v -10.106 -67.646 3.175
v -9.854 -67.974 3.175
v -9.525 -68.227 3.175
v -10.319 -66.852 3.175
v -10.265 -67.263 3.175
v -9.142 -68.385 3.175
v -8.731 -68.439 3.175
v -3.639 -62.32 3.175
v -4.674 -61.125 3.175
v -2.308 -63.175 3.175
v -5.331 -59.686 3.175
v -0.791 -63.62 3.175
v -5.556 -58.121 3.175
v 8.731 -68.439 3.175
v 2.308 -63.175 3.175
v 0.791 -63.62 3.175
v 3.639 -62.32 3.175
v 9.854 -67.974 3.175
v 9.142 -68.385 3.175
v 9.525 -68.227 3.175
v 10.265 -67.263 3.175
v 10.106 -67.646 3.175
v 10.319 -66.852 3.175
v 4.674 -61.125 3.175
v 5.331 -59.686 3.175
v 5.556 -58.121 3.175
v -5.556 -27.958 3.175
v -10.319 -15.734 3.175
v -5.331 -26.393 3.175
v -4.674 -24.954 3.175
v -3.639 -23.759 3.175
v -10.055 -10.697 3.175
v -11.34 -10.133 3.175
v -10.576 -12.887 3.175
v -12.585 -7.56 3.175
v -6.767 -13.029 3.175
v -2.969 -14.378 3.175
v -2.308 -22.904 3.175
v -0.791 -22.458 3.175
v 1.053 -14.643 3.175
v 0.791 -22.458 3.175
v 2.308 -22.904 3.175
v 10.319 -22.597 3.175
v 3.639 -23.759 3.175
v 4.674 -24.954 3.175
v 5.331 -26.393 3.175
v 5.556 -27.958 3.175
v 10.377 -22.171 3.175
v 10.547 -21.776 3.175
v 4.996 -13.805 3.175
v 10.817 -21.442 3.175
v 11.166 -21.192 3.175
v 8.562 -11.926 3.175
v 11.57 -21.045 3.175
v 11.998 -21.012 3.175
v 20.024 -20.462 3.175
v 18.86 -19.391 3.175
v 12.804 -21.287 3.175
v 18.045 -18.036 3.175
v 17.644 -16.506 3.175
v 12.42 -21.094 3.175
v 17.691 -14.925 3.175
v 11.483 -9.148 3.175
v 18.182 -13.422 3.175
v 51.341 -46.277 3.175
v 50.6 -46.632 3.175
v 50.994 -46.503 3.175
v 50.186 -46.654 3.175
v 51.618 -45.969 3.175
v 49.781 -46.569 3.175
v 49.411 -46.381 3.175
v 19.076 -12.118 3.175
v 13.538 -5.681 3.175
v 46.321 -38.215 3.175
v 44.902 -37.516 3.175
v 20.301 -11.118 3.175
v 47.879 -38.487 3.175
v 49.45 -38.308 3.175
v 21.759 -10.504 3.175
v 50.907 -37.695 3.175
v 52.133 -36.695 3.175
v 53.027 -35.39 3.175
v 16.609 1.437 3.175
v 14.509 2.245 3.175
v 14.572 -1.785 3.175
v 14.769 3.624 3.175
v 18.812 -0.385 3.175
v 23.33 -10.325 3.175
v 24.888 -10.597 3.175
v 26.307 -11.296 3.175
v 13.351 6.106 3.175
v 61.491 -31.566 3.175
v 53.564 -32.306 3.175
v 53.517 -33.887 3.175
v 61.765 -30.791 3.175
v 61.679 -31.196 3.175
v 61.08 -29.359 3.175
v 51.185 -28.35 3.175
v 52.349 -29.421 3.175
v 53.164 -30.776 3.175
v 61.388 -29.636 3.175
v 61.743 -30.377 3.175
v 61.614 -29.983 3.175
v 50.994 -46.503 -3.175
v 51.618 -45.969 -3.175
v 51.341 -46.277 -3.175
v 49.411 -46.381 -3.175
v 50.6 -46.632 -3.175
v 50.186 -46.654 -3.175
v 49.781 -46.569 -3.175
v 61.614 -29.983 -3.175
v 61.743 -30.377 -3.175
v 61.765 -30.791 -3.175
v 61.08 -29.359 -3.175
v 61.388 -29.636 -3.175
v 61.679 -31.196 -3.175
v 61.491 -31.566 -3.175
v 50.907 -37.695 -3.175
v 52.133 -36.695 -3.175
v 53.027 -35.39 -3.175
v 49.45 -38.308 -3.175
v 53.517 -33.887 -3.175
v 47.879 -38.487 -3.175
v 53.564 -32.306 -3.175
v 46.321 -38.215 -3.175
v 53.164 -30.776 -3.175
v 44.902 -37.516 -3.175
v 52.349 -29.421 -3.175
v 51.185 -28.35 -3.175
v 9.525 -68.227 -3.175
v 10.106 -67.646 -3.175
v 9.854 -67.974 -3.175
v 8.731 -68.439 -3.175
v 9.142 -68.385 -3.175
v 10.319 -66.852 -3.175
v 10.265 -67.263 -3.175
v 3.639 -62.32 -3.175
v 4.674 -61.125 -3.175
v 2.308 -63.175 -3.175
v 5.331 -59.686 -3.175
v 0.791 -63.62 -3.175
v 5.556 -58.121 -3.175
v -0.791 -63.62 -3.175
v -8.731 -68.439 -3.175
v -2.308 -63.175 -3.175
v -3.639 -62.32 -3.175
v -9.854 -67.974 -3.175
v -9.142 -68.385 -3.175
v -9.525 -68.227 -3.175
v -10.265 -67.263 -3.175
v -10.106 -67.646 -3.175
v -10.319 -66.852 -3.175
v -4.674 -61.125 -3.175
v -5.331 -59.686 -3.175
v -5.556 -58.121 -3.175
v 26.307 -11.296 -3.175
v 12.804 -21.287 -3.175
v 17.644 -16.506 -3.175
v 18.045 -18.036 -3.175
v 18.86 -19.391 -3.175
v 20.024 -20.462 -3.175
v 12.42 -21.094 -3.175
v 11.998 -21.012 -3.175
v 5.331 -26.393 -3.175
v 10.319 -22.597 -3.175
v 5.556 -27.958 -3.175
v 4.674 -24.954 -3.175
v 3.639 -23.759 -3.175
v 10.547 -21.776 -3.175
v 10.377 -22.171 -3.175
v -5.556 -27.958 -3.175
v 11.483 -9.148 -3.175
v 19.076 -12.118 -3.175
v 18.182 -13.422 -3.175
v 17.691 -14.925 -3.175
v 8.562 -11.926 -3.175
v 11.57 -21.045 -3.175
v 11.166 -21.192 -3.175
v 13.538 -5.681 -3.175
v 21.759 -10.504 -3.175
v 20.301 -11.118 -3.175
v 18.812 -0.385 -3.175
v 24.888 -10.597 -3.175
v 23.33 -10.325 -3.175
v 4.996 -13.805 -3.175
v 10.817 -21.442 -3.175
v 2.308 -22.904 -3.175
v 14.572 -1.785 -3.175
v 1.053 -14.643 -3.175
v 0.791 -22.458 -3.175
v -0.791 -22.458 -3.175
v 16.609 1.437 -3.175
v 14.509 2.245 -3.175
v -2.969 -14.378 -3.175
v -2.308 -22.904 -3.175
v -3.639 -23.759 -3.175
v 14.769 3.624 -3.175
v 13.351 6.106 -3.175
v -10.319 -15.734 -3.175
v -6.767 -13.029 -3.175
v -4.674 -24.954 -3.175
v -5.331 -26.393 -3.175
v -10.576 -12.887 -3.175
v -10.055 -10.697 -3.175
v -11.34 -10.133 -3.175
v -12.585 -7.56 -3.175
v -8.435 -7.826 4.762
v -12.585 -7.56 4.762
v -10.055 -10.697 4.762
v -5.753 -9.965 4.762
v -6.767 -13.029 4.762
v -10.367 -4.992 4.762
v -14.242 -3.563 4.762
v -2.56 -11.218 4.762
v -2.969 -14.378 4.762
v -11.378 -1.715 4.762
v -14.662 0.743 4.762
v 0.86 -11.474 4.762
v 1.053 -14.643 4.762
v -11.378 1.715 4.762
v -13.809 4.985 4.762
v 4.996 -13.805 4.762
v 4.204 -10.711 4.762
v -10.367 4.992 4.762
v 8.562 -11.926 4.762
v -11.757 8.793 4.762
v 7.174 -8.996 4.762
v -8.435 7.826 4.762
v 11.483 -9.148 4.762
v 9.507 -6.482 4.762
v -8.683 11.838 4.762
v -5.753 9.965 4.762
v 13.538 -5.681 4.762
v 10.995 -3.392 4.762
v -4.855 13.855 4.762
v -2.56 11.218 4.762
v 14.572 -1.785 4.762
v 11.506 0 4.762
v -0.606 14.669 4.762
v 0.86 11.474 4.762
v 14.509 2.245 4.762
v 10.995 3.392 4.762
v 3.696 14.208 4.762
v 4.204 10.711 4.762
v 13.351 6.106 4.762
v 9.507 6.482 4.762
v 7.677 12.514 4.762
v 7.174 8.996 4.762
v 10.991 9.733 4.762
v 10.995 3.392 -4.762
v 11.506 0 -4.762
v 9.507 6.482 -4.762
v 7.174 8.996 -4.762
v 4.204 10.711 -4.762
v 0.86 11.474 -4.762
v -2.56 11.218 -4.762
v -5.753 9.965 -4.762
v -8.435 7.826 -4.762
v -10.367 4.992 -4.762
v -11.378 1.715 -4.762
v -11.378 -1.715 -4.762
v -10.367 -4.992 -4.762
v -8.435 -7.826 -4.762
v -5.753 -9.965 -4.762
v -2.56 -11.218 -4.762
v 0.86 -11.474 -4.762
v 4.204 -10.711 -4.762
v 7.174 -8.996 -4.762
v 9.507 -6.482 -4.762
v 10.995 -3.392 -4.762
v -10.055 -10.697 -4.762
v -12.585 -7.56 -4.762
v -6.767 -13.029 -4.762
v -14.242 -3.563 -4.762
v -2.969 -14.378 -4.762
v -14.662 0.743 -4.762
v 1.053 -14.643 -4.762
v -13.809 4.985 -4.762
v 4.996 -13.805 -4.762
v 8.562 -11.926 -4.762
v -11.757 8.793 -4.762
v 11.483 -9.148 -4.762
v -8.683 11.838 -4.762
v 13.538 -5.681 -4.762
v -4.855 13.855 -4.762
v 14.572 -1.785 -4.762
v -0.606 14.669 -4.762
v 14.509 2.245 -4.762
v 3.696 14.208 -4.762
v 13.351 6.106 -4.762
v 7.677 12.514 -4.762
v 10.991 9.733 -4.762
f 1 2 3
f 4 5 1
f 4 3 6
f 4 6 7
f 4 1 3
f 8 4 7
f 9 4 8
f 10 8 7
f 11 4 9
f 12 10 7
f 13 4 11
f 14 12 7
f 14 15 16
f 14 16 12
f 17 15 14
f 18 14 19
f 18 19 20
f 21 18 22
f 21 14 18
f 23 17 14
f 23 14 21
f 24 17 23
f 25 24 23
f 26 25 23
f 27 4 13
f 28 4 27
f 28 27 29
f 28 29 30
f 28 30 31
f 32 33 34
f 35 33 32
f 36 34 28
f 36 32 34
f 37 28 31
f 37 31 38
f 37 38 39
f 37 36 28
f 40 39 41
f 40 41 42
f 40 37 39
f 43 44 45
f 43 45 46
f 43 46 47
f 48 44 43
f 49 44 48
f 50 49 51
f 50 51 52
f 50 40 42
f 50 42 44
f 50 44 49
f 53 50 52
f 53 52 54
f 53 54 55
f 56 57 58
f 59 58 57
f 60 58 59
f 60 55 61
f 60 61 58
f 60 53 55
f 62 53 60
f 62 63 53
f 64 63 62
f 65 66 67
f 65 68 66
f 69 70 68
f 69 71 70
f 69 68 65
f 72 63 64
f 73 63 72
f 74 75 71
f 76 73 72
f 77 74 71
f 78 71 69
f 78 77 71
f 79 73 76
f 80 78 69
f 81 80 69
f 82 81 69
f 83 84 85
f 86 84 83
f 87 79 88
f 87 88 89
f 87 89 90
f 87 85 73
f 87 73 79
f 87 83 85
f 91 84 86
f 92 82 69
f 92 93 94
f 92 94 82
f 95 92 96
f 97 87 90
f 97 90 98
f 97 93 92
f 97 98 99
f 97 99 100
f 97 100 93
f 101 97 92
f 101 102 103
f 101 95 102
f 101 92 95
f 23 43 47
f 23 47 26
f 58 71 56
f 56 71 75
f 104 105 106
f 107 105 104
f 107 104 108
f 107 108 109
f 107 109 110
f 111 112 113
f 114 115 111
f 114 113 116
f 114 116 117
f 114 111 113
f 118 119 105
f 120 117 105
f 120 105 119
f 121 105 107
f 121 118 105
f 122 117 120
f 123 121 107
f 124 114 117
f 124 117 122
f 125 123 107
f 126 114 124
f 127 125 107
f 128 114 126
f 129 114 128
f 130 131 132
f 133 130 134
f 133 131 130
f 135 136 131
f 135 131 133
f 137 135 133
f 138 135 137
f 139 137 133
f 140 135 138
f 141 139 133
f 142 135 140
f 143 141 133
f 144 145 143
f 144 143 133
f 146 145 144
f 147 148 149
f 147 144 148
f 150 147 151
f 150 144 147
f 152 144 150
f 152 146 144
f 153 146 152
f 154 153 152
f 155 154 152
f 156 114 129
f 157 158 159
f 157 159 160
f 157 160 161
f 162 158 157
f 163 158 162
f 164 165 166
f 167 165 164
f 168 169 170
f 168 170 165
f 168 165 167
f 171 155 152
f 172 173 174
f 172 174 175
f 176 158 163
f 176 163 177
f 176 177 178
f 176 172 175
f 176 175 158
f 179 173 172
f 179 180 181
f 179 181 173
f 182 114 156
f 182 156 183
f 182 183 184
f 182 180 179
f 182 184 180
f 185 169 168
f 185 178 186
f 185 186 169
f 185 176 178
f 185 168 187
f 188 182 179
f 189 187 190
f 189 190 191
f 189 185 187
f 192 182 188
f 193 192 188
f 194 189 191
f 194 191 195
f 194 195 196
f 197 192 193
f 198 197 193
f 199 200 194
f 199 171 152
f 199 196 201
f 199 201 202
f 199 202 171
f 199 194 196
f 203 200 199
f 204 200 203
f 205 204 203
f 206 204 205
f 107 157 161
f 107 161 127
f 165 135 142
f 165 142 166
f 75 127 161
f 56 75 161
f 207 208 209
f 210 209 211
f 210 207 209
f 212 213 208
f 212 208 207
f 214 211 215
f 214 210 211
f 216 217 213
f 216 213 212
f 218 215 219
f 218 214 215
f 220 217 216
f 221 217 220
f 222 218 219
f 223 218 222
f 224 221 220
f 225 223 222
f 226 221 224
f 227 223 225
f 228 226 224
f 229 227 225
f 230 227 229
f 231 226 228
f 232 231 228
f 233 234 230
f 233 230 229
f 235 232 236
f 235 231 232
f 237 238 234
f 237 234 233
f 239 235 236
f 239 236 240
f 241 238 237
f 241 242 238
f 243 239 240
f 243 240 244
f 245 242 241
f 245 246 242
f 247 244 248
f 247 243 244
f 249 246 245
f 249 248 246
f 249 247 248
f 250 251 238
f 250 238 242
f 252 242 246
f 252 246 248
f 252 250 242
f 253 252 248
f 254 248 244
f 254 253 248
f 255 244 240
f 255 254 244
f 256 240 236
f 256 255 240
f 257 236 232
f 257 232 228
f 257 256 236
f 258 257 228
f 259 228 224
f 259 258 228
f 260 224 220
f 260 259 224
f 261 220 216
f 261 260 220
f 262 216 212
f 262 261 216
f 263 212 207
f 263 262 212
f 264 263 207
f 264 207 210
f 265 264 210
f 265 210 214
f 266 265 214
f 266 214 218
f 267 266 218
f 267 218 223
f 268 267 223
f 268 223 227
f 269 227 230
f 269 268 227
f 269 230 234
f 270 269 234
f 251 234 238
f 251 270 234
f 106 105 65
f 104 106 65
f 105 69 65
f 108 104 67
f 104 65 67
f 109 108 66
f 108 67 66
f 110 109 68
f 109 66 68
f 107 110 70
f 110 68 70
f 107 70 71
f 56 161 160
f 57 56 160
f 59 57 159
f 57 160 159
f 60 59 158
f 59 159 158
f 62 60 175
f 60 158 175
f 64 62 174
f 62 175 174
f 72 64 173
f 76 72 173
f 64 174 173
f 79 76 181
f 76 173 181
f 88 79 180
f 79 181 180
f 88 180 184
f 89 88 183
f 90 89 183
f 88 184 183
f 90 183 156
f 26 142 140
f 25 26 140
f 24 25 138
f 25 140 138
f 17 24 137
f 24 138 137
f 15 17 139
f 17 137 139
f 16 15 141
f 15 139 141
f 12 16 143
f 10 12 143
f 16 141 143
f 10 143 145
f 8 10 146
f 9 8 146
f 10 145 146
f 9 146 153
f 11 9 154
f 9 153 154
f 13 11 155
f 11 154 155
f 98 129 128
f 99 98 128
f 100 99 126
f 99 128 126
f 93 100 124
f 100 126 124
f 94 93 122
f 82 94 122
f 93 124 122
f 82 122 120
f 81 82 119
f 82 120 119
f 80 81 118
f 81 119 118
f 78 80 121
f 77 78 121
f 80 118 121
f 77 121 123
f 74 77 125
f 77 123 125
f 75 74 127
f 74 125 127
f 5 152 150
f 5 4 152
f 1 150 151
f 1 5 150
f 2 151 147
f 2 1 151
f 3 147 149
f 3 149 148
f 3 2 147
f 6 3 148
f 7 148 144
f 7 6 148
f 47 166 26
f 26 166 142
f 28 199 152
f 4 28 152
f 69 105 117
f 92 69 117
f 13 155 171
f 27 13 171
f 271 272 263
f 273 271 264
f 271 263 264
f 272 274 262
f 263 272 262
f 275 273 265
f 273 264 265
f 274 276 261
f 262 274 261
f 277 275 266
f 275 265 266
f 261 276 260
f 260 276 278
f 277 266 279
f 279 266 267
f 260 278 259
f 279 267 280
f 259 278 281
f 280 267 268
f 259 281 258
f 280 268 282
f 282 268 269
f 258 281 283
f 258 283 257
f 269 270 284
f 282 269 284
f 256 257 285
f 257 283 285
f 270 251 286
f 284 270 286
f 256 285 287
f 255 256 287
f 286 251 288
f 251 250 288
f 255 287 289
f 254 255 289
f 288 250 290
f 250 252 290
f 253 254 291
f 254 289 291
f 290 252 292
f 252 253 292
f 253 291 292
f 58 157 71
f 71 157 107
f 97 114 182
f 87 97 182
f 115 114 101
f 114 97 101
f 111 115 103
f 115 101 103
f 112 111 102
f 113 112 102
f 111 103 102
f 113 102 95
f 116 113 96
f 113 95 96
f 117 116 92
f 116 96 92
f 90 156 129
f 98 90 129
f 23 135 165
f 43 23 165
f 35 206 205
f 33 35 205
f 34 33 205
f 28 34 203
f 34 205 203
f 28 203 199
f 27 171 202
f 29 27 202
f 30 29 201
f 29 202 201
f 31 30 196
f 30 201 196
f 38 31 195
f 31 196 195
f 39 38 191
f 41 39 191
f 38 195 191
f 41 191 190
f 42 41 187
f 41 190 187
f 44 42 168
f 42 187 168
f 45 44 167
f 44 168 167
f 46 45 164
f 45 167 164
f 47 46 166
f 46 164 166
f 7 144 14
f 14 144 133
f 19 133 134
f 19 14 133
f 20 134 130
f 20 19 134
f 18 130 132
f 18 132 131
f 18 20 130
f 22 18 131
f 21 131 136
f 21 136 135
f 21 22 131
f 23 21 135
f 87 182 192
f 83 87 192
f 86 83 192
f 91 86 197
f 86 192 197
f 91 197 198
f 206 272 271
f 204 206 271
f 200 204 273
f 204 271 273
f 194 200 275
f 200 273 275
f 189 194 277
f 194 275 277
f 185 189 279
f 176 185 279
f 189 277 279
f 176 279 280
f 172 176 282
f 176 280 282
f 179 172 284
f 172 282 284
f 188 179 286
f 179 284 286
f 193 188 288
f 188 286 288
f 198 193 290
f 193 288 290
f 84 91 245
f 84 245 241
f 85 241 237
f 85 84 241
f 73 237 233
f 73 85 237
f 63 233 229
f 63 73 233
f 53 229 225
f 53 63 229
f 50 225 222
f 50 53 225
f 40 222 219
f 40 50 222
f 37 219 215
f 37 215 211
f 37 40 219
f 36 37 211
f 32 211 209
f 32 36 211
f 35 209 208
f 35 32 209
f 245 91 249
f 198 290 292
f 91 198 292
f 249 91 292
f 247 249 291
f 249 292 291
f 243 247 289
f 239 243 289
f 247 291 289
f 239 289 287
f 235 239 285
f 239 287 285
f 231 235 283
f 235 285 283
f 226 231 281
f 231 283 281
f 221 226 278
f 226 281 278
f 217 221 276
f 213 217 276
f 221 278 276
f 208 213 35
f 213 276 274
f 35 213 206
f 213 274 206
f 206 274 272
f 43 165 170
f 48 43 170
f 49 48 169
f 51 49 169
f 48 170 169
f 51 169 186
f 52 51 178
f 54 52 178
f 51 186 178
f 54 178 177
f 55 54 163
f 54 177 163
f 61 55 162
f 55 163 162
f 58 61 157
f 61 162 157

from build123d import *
from build123d.topology import SkipClean

# Parameters (mm, degrees)
BOSS_EXTRUDE1_DEPTH      = 4.7625
BOSS_EXTRUDE1_DEPTH_BACK = 4.7625
SKETCH1_R                = 11.5062
CUT_EXTRUDE1_START       = 3.175
CUT_EXTRUDE1_DEPTH       = 1.5875
CUT_EXTRUDE2_START       = -4.7625
CUT_EXTRUDE2_DEPTH       = 1.5875
FILLET1_R                = 1.5875


with BuildPart() as part:
    # Sketch1 → Boss-Extrude1 (new, two sides: drawn at the far end of the back side and taken through both)
    # profile 1 of 2: a face of its own
    with BuildSketch(Plane.XY.offset(-BOSS_EXTRUDE1_DEPTH_BACK)):
        with BuildLine():
            ThreePointArc((-12.585193267, -7.559797873), (-10.89585042, -11.492870345), (-10.31875, -15.734319794))
            Line((-10.31875, -15.734319794), (-10.31875, -68.439319794))
            Line((-10.31875, -68.439319794), (10.31875, -68.439319794))
            Line((10.31875, -68.439319794), (10.31875, -22.596549828))
            ThreePointArc((10.31875, -22.596549828), (11.166228871, -21.192083745), (12.80382084, -21.287151937))
            Line((12.80382084, -21.287151937), (50.720494758, -47.278411809))
            Line((50.720494758, -47.278411809), (62.388915679, -30.256239225))
            Line((62.388915679, -30.256239225), (18.812153865, -0.385081668))
            ThreePointArc((18.812153865, -0.385081668), (15.640023815, 2.489031981), (13.351109218, 6.106186705))
            ThreePointArc((13.351109218, 6.106186705), (6.843715397, -12.988502339), (-12.585193267, -7.559797873))
        make_face()
        with BuildLine():
            ThreePointArc((5.55625, -58.120569794), (0, -63.676819794), (-5.55625, -58.120569794))
            Line((-5.55625, -58.120569794), (-5.55625, -27.958069794))
            ThreePointArc((-5.55625, -27.958069794), (0, -22.401819794), (5.55625, -27.958069794))
            Line((5.55625, -27.958069794), (5.55625, -58.120569794))
        make_face(mode=Mode.SUBTRACT)
        with BuildLine():
            ThreePointArc((51.185116867, -28.350222438), (52.626511545, -36.074612997), (44.902120986, -37.516007675))
            Line((44.902120986, -37.516007675), (20.023561057, -20.462161714))
            ThreePointArc((20.023561057, -20.462161714), (18.582166378, -12.737771155), (26.306556937, -11.296376477))
            Line((26.306556937, -11.296376477), (51.185116867, -28.350222438))
        make_face(mode=Mode.SUBTRACT)
    # profile 2 of 2: a face of its own
    with BuildSketch(Plane.XY.offset(-BOSS_EXTRUDE1_DEPTH_BACK)):
        with BuildLine():
            ThreePointArc((13.351109218, 6.106186705), (-6.843715397, 12.988502339), (-12.585193267, -7.559797873))
            ThreePointArc((-12.585193267, -7.559797873), (6.843715397, -12.988502339), (13.351109218, 6.106186705))
        make_face()
        Circle(SKETCH1_R, mode=Mode.SUBTRACT)
    extrude(amount=BOSS_EXTRUDE1_DEPTH + BOSS_EXTRUDE1_DEPTH_BACK)

    # Sketch1<8> → Cut-Extrude1 (cut)
    with SkipClean():  # the faces are left unmerged after this step: merging them gives an invalid solid
        with BuildSketch(Plane.XY.offset(CUT_EXTRUDE1_START)):
            with BuildLine():
                ThreePointArc((-12.585193267, -7.559797873), (-10.89585042, -11.492870345), (-10.31875, -15.734319794))
                Line((-10.31875, -15.734319794), (-10.31875, -68.439319794))
                Line((-10.31875, -68.439319794), (10.31875, -68.439319794))
                Line((10.31875, -68.439319794), (10.31875, -22.596549828))
                ThreePointArc((10.31875, -22.596549828), (11.166228871, -21.192083745), (12.80382084, -21.287151937))
                Line((12.80382084, -21.287151937), (50.720494758, -47.278411809))
                Line((50.720494758, -47.278411809), (62.388915679, -30.256239225))
                Line((62.388915679, -30.256239225), (18.812153865, -0.385081668))
                ThreePointArc((18.812153865, -0.385081668), (15.640023815, 2.489031981), (13.351109218, 6.106186705))
                ThreePointArc((13.351109218, 6.106186705), (6.843715397, -12.988502339), (-12.585193267, -7.559797873))
            make_face()
            with BuildLine():
                ThreePointArc((5.55625, -58.120569794), (0, -63.676819794), (-5.55625, -58.120569794))
                Line((-5.55625, -58.120569794), (-5.55625, -27.958069794))
                ThreePointArc((-5.55625, -27.958069794), (0, -22.401819794), (5.55625, -27.958069794))
                Line((5.55625, -27.958069794), (5.55625, -58.120569794))
            make_face(mode=Mode.SUBTRACT)
            with BuildLine():
                ThreePointArc((51.185116867, -28.350222438), (52.626511545, -36.074612997), (44.902120986, -37.516007675))
                Line((44.902120986, -37.516007675), (20.023561057, -20.462161714))
                ThreePointArc((20.023561057, -20.462161714), (18.582166378, -12.737771155), (26.306556937, -11.296376477))
                Line((26.306556937, -11.296376477), (51.185116867, -28.350222438))
            make_face(mode=Mode.SUBTRACT)
        extrude(amount=CUT_EXTRUDE1_DEPTH, mode=Mode.SUBTRACT)

    # Sketch1<9> → Cut-Extrude2 (cut)
    with SkipClean():  # the faces are left unmerged after this step: merging them gives an invalid solid
        with BuildSketch(Plane.XY.offset(CUT_EXTRUDE2_START)):
            with BuildLine():
                ThreePointArc((-12.585193267, -7.559797873), (6.843715397, -12.988502339), (13.351109218, 6.106186705))
                ThreePointArc((13.351109218, 6.106186705), (15.640023815, 2.489031981), (18.812153865, -0.385081668))
                Line((18.812153865, -0.385081668), (62.388915679, -30.256239225))
                Line((62.388915679, -30.256239225), (50.720494758, -47.278411809))
                Line((50.720494758, -47.278411809), (12.80382084, -21.287151937))
                ThreePointArc((12.80382084, -21.287151937), (11.166228871, -21.192083745), (10.31875, -22.596549828))
                Line((10.31875, -22.596549828), (10.31875, -68.439319794))
                Line((10.31875, -68.439319794), (-10.31875, -68.439319794))
                Line((-10.31875, -68.439319794), (-10.31875, -15.734319794))
                ThreePointArc((-10.31875, -15.734319794), (-10.89585042, -11.492870345), (-12.585193267, -7.559797873))
            make_face()
            with BuildLine():
                ThreePointArc((26.306556937, -11.296376477), (18.582166378, -12.737771155), (20.023561057, -20.462161714))
                Line((20.023561057, -20.462161714), (44.902120986, -37.516007675))
                ThreePointArc((44.902120986, -37.516007675), (52.626511545, -36.074612997), (51.185116867, -28.350222438))
                Line((51.185116867, -28.350222438), (26.306556937, -11.296376477))
            make_face(mode=Mode.SUBTRACT)
            with BuildLine():
                ThreePointArc((5.55625, -27.958069794), (0, -22.401819794), (-5.55625, -27.958069794))
                Line((-5.55625, -27.958069794), (-5.55625, -58.120569794))
                ThreePointArc((-5.55625, -58.120569794), (0, -63.676819794), (5.55625, -58.120569794))
                Line((5.55625, -58.120569794), (5.55625, -27.958069794))
            make_face(mode=Mode.SUBTRACT)
        extrude(amount=CUT_EXTRUDE2_DEPTH, mode=Mode.SUBTRACT)

    # Fillet1
    fillet1_edges = [part.edges().sort_by_distance(p)[0] for p in [
        (-10.31875, -68.439319794, 0),
        (10.31875, -68.439319794, 0),
        (50.720494758, -47.278411809, 0),
        (62.388915679, -30.256239225, 0),
    ]]
    fillet(fillet1_edges, radius=FILLET1_R)


solid = part.part
